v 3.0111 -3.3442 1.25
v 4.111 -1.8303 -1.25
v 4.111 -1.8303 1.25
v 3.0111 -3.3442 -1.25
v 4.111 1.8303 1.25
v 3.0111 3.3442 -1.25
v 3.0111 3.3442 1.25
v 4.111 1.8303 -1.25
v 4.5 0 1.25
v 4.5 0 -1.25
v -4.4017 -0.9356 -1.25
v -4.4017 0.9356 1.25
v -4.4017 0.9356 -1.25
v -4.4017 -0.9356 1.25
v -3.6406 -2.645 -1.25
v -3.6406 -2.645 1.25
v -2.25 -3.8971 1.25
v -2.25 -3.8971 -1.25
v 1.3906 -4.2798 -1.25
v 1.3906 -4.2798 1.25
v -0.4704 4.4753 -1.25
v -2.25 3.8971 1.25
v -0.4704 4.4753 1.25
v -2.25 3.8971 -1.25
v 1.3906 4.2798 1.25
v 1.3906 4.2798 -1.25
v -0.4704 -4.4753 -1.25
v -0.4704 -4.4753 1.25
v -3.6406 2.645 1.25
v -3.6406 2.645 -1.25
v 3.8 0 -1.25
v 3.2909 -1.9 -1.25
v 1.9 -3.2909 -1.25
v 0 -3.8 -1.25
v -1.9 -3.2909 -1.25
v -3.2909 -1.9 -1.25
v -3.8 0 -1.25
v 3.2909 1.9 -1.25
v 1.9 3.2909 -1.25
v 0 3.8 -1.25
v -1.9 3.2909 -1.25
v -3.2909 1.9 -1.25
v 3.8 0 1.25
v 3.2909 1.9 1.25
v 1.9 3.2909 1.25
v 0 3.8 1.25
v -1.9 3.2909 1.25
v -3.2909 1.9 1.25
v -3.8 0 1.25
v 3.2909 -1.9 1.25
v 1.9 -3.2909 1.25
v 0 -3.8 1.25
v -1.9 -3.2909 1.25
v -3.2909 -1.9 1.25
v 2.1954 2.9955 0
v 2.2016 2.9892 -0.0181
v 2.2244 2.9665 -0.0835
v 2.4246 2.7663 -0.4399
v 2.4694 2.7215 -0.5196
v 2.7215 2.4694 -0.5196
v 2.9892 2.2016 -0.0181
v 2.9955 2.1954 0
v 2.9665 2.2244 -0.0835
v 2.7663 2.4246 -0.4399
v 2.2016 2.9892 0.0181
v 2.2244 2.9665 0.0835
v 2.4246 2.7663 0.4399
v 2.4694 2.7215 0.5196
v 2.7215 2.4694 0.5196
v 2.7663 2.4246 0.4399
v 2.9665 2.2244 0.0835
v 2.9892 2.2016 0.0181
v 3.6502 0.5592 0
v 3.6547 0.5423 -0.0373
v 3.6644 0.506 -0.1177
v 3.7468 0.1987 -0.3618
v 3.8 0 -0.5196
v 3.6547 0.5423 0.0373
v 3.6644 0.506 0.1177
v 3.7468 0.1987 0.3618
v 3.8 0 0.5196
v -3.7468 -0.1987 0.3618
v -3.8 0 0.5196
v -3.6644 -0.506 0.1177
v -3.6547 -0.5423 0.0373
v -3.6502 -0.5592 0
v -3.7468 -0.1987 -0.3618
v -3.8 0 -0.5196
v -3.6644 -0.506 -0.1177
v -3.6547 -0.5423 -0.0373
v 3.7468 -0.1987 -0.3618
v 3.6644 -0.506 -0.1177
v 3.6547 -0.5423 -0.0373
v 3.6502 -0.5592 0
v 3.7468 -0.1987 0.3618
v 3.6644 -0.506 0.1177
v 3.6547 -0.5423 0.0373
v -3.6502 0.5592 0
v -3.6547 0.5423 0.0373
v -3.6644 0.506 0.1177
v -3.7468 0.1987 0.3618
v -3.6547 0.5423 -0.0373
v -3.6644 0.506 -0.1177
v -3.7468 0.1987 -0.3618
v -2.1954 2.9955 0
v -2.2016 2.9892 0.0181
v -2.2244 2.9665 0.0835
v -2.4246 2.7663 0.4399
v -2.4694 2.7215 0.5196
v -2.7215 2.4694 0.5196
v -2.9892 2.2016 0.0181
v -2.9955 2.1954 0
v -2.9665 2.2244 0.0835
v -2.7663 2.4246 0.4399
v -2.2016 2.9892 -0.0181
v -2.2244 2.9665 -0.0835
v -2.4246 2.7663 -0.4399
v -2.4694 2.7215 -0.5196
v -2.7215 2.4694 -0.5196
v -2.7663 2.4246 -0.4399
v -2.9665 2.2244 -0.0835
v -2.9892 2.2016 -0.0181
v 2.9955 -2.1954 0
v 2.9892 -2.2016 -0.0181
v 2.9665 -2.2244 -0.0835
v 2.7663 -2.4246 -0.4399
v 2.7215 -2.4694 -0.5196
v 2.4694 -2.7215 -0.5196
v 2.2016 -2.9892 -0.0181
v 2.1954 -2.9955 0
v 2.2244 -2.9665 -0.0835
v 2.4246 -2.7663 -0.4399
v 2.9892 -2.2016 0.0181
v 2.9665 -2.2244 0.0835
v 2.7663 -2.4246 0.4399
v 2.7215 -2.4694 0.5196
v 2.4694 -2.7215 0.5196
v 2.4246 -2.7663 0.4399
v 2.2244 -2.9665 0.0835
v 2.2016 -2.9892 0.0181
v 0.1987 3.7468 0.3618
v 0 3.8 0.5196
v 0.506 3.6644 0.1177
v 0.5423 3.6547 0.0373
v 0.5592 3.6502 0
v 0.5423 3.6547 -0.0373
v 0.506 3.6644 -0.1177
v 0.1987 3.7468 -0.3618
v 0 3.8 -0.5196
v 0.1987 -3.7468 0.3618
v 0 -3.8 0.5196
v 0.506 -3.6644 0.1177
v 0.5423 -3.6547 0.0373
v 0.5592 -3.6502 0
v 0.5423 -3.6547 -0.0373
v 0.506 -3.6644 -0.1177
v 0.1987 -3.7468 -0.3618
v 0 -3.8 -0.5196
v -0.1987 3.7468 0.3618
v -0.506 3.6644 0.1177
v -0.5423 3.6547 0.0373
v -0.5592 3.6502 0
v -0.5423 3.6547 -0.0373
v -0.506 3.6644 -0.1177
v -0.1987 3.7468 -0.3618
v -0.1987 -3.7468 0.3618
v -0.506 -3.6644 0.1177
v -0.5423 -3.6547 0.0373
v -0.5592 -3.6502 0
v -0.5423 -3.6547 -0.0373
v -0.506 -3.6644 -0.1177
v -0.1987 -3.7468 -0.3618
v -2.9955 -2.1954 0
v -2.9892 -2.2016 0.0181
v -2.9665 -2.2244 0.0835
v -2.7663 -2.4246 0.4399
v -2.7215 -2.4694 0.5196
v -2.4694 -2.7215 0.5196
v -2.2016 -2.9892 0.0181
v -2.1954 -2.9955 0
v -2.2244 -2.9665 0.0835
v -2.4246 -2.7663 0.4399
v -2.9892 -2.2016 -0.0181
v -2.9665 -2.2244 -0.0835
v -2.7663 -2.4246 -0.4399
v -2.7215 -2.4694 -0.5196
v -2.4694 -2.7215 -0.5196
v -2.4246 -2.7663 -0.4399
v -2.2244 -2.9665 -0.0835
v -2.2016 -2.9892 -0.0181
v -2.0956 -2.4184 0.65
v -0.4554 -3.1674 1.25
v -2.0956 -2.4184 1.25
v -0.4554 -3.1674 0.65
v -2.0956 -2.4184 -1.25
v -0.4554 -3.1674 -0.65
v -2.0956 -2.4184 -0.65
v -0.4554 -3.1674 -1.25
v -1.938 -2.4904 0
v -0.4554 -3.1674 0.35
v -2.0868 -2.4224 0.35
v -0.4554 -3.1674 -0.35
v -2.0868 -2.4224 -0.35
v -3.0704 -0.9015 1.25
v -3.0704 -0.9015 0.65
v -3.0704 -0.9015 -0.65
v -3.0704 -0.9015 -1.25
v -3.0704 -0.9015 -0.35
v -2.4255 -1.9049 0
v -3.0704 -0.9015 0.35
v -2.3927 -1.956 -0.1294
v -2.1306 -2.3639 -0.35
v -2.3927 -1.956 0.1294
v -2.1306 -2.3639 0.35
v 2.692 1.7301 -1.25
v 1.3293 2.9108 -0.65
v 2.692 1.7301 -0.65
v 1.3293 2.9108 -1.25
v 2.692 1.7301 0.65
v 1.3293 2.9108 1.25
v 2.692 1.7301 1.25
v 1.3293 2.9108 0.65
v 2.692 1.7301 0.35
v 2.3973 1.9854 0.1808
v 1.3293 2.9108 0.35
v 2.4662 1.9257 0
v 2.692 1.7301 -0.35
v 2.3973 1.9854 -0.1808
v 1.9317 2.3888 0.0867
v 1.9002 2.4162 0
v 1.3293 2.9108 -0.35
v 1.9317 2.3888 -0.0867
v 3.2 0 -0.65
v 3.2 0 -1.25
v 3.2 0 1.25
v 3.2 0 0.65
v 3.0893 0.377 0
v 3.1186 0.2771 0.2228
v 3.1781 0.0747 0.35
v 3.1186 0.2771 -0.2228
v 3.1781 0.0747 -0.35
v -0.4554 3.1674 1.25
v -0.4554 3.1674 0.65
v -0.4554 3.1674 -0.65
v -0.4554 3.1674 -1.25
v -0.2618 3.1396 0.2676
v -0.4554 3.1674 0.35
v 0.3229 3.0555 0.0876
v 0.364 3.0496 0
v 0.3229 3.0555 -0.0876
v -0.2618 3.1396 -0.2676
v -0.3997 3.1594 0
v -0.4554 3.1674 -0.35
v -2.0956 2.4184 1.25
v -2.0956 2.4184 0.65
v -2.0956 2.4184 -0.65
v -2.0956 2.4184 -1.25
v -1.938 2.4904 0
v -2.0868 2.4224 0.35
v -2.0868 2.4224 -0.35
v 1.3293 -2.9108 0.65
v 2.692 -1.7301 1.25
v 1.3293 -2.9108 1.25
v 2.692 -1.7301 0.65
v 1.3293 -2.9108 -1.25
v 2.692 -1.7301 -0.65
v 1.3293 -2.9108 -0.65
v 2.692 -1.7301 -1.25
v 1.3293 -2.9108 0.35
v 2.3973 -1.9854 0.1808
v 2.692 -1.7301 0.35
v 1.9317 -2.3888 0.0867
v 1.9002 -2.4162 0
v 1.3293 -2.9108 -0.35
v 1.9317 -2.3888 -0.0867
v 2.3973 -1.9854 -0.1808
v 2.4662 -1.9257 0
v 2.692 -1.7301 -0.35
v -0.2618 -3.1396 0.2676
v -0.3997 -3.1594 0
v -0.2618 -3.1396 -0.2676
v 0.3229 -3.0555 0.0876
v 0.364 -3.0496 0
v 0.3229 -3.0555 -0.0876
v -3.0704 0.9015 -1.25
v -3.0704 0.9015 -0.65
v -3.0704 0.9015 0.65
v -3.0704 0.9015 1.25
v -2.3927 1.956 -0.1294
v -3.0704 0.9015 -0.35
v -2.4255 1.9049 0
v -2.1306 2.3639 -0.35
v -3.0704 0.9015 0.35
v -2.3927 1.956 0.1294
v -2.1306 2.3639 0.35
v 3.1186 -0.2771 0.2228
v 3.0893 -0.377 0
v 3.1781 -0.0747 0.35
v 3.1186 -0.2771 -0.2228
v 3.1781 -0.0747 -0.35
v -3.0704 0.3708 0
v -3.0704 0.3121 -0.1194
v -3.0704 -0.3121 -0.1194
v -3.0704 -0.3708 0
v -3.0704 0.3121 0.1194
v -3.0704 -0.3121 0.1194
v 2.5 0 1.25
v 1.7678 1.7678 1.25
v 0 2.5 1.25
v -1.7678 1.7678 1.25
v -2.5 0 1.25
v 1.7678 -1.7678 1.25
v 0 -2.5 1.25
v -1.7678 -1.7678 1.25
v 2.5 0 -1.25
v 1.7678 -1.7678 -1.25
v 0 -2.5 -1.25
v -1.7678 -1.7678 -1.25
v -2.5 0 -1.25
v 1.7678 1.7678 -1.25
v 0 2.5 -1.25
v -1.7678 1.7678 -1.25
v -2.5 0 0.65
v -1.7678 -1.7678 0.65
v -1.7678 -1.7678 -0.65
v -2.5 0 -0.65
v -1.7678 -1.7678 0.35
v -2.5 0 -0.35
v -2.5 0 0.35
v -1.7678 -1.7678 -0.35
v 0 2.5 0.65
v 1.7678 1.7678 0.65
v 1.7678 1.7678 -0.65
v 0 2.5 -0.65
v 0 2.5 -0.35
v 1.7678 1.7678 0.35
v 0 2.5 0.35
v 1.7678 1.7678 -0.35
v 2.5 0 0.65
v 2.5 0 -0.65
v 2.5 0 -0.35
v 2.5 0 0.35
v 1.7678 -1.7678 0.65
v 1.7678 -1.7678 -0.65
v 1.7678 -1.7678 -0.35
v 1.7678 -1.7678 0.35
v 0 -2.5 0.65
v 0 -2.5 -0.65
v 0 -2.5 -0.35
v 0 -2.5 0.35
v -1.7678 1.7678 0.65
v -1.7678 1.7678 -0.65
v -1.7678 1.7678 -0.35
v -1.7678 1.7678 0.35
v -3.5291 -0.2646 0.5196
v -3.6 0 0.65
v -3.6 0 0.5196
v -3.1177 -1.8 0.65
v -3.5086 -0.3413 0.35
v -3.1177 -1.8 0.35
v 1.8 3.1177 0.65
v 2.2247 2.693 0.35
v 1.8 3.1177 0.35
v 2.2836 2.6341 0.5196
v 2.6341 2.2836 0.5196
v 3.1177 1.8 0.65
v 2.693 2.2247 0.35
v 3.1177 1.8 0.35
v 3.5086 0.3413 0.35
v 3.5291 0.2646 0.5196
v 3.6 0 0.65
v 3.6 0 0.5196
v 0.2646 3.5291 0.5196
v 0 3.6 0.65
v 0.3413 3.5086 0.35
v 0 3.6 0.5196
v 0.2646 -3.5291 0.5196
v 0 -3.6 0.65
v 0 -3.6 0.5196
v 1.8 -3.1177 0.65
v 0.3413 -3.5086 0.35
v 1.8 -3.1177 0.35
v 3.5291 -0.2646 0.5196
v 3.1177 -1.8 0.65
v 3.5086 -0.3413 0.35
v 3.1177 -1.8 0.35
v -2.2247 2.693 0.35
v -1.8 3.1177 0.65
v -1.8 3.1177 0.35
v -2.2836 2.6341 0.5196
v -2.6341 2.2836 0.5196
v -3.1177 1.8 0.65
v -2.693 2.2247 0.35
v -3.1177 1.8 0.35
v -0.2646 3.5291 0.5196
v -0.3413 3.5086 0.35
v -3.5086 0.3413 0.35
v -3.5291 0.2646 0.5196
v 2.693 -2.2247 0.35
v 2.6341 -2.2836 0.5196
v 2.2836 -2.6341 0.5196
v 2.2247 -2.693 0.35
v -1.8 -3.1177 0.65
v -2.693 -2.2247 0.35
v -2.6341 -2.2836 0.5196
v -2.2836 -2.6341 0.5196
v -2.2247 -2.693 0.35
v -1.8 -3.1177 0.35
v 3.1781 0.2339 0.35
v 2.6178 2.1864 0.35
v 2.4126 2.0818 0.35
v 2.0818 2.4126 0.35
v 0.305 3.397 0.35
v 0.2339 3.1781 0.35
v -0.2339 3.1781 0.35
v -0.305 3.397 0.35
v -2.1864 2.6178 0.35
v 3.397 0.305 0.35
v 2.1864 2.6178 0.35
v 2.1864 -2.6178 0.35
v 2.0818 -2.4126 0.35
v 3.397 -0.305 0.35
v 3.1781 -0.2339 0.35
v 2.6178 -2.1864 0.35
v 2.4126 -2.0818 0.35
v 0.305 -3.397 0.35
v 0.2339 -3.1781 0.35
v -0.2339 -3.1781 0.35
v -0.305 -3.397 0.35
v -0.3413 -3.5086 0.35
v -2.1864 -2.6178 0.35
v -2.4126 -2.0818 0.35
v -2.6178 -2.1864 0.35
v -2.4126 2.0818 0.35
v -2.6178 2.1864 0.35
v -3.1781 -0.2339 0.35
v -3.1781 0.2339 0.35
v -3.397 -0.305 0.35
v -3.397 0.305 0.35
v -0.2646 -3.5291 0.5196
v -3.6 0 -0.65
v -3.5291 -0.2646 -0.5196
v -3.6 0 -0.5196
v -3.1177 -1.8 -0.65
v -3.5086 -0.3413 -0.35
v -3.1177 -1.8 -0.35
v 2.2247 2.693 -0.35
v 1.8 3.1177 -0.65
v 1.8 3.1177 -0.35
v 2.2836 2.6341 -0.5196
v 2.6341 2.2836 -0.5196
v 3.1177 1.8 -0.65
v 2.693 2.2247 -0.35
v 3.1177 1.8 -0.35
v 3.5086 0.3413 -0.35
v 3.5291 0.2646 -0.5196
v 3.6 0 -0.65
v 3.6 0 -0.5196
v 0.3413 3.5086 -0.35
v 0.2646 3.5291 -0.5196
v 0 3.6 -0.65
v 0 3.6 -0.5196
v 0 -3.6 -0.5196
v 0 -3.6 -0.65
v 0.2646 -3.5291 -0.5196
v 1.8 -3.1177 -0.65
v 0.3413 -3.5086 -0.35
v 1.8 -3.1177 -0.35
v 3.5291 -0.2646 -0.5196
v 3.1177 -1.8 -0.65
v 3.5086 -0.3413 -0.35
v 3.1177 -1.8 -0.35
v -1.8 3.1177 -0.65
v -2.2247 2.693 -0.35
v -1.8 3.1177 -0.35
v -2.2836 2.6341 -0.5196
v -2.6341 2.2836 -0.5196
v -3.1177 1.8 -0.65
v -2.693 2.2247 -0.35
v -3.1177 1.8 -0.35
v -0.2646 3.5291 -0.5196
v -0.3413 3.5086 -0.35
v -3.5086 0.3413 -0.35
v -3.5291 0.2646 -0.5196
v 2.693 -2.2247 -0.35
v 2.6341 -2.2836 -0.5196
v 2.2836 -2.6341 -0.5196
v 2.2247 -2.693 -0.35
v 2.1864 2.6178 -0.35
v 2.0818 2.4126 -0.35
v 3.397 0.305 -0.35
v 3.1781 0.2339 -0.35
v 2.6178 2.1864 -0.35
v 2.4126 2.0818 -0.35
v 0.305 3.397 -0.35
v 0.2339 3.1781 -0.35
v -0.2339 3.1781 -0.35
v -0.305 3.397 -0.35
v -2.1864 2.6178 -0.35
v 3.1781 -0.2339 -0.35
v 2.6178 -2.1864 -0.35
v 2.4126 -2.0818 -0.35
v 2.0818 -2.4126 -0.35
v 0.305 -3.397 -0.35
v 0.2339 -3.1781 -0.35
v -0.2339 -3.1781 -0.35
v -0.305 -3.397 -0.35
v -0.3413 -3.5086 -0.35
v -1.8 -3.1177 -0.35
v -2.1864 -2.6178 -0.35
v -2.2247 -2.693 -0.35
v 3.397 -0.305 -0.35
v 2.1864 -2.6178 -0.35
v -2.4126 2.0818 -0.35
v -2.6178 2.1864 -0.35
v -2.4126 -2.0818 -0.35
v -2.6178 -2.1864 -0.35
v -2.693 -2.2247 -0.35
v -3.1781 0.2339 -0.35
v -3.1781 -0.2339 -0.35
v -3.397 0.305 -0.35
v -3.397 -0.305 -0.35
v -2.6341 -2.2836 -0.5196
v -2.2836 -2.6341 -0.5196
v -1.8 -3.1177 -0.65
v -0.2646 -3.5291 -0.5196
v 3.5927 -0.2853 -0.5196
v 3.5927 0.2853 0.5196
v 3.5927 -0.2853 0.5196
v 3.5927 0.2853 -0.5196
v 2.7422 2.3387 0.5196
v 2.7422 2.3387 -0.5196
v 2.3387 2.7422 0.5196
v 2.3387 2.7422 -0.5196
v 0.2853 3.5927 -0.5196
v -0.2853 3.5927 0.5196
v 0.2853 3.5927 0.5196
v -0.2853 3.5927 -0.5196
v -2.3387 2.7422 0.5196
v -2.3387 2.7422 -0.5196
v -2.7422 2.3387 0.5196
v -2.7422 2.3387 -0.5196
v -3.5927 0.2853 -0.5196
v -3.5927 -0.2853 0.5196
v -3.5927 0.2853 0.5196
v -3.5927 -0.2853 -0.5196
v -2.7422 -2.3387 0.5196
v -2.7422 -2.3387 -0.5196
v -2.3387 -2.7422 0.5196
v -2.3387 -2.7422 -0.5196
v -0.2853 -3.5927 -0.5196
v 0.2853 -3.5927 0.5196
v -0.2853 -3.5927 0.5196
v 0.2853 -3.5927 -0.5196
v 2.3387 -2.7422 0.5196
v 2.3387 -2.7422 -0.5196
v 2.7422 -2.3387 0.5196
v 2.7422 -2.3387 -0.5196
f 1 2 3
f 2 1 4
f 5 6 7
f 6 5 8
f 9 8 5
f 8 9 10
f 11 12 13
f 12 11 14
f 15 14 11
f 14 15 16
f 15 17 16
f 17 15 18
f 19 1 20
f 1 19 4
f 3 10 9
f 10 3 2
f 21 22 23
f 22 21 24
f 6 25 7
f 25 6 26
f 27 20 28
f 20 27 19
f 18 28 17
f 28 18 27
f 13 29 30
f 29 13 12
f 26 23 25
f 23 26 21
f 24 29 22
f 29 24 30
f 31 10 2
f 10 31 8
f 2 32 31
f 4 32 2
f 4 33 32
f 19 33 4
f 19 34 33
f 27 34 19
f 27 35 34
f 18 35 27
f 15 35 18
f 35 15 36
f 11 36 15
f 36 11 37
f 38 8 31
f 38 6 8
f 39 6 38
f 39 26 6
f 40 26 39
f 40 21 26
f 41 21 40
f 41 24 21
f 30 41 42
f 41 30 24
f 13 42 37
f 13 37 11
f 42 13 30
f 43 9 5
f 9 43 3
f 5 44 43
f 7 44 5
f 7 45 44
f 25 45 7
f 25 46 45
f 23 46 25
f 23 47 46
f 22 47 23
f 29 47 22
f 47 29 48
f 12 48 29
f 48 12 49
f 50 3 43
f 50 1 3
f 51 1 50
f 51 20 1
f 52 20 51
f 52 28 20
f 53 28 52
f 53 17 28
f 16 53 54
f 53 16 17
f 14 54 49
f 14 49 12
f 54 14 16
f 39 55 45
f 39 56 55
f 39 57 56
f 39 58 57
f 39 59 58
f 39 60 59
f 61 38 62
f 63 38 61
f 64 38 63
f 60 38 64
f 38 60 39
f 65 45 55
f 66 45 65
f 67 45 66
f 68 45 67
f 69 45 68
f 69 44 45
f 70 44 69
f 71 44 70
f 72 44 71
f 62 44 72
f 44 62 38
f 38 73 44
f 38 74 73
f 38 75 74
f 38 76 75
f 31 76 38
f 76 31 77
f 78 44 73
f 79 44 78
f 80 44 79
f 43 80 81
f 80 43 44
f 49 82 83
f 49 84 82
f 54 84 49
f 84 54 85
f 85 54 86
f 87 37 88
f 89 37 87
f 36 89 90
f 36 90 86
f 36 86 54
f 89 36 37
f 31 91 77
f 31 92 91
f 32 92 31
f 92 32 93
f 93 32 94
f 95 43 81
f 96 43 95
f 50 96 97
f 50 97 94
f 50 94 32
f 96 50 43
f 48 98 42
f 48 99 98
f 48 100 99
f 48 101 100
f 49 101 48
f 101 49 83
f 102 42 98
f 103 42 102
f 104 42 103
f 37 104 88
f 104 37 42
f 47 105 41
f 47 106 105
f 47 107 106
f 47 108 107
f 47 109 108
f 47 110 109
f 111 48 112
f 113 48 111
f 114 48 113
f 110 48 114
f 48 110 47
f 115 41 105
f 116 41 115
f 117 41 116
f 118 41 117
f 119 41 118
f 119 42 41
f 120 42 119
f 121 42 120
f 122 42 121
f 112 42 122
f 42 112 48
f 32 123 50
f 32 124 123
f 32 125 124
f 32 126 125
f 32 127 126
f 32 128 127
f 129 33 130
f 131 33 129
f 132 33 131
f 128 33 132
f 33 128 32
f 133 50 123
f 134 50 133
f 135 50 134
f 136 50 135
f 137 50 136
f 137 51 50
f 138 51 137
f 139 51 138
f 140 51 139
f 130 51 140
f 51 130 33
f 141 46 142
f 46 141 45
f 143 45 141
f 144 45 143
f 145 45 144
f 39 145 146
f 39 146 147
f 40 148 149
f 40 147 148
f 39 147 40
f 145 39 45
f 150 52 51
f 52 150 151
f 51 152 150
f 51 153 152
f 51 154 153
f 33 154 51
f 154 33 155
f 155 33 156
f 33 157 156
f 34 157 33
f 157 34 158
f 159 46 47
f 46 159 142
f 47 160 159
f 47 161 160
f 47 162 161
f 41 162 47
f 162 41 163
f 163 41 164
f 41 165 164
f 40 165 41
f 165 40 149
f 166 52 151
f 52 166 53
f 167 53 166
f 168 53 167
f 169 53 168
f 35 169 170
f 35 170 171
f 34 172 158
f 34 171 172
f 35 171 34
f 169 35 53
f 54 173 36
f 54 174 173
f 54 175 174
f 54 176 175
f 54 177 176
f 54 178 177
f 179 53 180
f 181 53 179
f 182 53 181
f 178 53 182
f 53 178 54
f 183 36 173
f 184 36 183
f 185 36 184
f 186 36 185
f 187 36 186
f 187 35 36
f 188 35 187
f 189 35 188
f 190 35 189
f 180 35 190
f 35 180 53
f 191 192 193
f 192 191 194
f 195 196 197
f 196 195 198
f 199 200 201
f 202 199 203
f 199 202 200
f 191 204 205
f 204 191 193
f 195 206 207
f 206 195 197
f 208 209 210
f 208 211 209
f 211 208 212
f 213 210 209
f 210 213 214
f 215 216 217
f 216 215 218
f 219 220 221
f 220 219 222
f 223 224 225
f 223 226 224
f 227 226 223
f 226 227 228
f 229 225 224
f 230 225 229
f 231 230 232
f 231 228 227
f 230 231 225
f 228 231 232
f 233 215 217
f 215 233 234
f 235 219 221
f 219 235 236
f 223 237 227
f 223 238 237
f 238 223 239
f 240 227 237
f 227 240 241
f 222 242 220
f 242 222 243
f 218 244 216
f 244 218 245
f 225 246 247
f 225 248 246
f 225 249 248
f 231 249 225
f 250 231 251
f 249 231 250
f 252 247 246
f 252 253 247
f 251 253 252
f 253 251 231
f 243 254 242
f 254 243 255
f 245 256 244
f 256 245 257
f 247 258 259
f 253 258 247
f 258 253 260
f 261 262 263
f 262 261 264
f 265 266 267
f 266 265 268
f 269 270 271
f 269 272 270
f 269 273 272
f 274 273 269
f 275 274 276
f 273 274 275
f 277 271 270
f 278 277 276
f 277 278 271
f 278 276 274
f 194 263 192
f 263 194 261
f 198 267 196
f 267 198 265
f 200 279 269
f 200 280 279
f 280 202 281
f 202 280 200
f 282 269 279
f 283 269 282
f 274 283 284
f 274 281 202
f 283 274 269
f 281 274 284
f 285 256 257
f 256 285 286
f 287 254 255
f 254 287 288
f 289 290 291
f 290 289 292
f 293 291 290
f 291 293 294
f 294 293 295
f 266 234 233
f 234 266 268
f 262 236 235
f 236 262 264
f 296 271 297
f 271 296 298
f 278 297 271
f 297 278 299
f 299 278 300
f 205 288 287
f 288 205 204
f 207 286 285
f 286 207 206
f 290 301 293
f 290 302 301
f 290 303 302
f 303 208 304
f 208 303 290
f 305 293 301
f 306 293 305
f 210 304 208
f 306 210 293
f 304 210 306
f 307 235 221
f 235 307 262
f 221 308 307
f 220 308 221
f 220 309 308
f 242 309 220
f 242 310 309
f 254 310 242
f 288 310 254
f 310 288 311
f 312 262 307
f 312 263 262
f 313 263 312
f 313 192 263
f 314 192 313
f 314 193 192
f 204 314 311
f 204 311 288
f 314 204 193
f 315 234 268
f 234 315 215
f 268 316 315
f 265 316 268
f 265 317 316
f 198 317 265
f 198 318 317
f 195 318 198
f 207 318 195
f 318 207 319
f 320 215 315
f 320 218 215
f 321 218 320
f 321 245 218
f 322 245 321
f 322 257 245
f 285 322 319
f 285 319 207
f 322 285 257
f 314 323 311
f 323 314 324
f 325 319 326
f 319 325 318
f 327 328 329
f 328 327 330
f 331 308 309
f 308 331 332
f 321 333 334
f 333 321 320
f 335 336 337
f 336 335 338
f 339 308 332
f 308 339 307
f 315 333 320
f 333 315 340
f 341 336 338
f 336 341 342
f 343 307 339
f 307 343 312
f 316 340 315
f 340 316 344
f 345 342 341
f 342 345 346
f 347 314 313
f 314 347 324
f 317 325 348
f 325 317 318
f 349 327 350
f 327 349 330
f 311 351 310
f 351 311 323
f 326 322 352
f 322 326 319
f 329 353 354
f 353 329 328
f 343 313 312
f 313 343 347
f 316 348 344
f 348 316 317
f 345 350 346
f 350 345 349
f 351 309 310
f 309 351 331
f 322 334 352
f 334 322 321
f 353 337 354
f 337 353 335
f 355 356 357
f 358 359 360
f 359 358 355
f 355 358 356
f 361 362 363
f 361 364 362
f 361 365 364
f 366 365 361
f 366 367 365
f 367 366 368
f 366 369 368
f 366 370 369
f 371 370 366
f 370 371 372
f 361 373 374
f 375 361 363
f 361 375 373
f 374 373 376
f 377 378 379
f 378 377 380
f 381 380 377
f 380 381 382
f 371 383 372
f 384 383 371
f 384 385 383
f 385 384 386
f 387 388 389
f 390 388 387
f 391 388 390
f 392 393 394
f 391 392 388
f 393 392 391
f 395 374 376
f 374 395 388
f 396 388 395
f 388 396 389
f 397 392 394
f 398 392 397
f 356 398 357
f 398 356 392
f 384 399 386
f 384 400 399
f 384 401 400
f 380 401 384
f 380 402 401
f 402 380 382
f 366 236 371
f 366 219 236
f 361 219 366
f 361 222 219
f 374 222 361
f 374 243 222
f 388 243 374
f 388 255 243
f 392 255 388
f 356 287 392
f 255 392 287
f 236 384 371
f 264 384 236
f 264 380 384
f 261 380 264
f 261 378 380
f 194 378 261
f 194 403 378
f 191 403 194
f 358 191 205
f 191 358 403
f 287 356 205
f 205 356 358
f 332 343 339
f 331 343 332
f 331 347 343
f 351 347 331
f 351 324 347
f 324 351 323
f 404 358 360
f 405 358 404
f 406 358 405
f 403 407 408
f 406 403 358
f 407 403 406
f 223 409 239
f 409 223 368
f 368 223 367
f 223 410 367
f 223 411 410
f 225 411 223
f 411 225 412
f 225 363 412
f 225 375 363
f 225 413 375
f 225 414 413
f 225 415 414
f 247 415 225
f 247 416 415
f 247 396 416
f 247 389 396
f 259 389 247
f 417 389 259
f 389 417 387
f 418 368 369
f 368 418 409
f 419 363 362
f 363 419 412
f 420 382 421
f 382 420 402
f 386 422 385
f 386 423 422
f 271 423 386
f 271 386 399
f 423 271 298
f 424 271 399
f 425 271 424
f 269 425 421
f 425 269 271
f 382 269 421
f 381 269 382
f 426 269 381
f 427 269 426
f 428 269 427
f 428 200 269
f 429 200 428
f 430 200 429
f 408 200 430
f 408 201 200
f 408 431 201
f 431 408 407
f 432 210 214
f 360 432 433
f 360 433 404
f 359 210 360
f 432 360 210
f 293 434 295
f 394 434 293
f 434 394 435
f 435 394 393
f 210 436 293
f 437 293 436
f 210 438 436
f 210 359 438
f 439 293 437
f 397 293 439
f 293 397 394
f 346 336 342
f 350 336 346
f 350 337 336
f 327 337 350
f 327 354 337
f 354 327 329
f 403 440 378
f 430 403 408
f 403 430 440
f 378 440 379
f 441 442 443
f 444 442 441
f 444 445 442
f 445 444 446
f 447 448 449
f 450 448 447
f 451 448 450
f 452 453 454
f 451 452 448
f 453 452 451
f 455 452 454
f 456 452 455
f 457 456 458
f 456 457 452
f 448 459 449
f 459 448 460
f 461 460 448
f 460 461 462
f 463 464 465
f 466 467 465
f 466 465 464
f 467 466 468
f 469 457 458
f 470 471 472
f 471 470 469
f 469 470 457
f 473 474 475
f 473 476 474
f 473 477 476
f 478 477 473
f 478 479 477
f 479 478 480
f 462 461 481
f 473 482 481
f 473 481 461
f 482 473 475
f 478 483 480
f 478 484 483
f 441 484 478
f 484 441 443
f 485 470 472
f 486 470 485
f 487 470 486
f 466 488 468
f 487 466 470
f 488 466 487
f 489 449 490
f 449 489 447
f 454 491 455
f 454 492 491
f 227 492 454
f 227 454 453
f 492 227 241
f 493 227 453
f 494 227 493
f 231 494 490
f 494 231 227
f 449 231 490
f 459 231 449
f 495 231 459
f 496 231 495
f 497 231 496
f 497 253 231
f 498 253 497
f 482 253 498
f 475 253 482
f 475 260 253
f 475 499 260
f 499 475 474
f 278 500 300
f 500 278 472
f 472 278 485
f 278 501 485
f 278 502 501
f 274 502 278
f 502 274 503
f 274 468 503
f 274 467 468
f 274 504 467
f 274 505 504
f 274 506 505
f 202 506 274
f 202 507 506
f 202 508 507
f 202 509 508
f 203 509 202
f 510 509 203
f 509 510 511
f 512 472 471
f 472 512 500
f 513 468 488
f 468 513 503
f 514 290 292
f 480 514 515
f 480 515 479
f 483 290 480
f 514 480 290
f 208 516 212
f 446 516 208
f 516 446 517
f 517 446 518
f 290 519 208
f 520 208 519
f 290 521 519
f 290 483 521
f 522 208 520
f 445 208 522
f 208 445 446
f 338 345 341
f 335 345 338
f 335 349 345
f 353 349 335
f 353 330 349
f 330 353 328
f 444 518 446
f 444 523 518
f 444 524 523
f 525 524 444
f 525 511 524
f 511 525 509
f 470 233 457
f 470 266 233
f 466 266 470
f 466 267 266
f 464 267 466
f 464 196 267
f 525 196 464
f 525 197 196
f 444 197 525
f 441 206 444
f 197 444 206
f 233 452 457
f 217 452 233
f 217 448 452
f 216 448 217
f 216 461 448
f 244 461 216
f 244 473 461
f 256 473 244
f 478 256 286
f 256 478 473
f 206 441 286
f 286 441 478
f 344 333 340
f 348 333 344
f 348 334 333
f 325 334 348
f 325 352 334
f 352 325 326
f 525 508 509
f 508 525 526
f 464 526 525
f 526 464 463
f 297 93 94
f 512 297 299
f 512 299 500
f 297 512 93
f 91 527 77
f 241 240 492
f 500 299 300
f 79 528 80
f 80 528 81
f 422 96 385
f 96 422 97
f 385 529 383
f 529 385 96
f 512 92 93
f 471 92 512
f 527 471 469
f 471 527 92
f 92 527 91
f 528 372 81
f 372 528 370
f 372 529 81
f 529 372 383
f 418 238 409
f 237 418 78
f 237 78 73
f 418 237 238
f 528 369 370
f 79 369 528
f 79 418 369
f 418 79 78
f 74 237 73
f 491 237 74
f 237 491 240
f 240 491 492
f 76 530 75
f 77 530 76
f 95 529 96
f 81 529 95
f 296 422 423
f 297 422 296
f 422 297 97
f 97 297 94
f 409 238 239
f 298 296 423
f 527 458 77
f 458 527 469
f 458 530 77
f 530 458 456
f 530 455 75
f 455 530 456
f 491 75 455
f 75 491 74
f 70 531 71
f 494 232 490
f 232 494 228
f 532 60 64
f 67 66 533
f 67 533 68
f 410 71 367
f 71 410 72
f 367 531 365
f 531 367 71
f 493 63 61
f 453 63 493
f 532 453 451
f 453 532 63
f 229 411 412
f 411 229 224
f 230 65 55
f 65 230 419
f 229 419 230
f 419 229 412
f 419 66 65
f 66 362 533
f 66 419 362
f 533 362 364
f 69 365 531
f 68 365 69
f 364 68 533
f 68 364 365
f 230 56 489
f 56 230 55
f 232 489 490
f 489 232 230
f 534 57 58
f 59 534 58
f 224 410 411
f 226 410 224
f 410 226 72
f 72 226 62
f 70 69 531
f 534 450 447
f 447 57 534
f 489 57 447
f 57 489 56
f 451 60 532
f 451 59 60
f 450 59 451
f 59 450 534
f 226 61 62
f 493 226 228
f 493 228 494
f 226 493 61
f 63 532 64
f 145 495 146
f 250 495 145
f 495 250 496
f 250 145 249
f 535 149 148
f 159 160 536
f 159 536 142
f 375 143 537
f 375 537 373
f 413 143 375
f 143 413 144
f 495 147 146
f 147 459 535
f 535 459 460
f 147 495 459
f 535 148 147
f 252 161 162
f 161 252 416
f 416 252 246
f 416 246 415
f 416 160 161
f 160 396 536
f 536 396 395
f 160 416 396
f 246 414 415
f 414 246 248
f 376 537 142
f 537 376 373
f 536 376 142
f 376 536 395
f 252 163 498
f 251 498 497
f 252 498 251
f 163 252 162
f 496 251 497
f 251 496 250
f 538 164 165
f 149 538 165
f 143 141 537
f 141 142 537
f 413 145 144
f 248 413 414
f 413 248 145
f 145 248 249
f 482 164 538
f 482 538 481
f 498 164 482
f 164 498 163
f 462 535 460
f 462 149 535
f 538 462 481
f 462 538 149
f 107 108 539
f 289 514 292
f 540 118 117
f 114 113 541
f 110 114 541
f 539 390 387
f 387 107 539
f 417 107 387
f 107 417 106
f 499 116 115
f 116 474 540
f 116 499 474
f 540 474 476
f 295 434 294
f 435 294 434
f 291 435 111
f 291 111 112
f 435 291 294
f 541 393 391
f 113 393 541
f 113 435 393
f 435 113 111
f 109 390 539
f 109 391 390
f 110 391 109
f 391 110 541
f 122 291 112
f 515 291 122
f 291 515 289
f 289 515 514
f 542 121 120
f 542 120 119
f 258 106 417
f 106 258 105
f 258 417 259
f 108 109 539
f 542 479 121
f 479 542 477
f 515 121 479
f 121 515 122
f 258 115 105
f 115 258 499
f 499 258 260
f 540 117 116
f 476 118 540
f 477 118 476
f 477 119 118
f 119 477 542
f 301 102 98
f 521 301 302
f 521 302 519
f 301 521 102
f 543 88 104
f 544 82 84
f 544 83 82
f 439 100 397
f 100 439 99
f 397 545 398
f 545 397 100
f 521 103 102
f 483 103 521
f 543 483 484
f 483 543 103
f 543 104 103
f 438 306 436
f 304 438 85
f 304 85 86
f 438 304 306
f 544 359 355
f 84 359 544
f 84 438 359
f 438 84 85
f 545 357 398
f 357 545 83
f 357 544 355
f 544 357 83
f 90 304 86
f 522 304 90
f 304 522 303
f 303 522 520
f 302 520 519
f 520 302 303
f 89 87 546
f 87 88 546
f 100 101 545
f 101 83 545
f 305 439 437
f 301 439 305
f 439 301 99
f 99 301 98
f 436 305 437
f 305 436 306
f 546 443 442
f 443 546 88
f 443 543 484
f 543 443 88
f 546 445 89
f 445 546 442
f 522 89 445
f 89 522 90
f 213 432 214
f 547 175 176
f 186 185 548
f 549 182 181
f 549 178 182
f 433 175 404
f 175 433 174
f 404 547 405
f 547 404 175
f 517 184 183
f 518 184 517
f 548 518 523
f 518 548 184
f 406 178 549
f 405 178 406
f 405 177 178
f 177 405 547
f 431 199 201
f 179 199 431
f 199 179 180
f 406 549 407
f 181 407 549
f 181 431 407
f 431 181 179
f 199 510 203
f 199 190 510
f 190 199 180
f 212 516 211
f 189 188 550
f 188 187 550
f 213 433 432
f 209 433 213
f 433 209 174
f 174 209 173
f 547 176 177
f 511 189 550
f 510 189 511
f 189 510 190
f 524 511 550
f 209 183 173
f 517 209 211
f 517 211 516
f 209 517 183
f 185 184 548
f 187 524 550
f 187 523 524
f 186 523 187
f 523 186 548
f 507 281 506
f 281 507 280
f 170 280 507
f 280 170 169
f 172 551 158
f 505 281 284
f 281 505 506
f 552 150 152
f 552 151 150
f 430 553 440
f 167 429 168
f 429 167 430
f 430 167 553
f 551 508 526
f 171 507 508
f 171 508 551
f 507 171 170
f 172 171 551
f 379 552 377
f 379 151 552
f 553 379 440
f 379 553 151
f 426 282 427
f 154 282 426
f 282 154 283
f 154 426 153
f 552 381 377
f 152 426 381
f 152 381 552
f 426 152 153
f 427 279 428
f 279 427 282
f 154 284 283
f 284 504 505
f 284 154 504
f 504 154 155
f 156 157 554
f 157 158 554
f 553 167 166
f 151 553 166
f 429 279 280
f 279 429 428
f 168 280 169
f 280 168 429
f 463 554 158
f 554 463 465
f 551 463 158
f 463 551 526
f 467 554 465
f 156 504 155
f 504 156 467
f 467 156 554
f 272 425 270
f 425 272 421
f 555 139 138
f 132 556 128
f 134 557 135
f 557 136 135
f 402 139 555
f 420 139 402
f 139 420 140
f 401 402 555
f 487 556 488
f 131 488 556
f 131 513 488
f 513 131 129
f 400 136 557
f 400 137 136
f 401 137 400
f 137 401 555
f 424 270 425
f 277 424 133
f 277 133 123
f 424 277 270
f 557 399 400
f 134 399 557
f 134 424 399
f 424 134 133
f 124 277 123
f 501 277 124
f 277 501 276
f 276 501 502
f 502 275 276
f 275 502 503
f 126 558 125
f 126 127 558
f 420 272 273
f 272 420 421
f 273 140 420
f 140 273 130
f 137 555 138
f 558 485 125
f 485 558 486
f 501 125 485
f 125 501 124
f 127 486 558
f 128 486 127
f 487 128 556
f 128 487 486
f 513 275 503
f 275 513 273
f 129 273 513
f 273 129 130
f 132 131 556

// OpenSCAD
// Parameters
bore_diameter_mm = 5; //[2.5:10:0.1]
outer_diameter_mm = 9; //[4.5:18:0.1]
width_mm = 2.5; //[1.25:5:0.1]
radial_rim_thickness_mm = 0.7; //[0.35:1.4:0.05]
radial_hub_thickness_mm = 0.7; //[0.35:1.4:0.05]
shield_thickness_mm = 0.3; //[0.15:0.8:0.05]
shield_radial_clearance_mm = 0.2; //[0.05:0.6:0.05]
ball_diameter_mm = 1.2; //[0.6:2.4:0.05]
ball_count = 8; //[4:16:1]
overlap_mm = 0.6; //[0.2:1.5:0.1]

// Bearing Ball - complete geometry
module bearing_ball() {
  color("Silver") {
    sphere(r=ball_diameter_mm/2);
  }
}

// Ball Bearing - complete geometry
module ball_bearing() {
  color("DimGray") {
    // Outer Race
    difference() {
      cylinder(r=outer_diameter_mm/2, h=width_mm, center=true);
      cylinder(r=outer_diameter_mm/2 - radial_rim_thickness_mm, h=width_mm + 2*overlap_mm, center=true);
    }
    
    // Inner Race
    difference() {
      cylinder(r=bore_diameter_mm/2 + radial_hub_thickness_mm, h=width_mm, center=true);
      cylinder(r=bore_diameter_mm/2, h=width_mm + 2*overlap_mm, center=true);
    }
    
    // Shields
    union() {
      translate([0, 0, width_mm/2 - shield_thickness_mm/2 - overlap_mm])
        cylinder(r=outer_diameter_mm/2 - radial_rim_thickness_mm - shield_radial_clearance_mm, h=shield_thickness_mm, center=true);
      translate([0, 0, -width_mm/2 + shield_thickness_mm/2 + overlap_mm])
        cylinder(r=outer_diameter_mm/2 - radial_rim_thickness_mm - shield_radial_clearance_mm, h=shield_thickness_mm, center=true);
    }
    
    // Bearing Balls
    for (i = [0:ball_count-1]) {
      rotate([0, 0, i*360/ball_count]) 
        translate([(bore_diameter_mm/2 + radial_hub_thickness_mm + (outer_diameter_mm/2 - radial_rim_thickness_mm))/2, 0, 0])
        bearing_ball();
    }
  }
}

// Assembly
module assembly() {
  ball_bearing();
}

assembly();
